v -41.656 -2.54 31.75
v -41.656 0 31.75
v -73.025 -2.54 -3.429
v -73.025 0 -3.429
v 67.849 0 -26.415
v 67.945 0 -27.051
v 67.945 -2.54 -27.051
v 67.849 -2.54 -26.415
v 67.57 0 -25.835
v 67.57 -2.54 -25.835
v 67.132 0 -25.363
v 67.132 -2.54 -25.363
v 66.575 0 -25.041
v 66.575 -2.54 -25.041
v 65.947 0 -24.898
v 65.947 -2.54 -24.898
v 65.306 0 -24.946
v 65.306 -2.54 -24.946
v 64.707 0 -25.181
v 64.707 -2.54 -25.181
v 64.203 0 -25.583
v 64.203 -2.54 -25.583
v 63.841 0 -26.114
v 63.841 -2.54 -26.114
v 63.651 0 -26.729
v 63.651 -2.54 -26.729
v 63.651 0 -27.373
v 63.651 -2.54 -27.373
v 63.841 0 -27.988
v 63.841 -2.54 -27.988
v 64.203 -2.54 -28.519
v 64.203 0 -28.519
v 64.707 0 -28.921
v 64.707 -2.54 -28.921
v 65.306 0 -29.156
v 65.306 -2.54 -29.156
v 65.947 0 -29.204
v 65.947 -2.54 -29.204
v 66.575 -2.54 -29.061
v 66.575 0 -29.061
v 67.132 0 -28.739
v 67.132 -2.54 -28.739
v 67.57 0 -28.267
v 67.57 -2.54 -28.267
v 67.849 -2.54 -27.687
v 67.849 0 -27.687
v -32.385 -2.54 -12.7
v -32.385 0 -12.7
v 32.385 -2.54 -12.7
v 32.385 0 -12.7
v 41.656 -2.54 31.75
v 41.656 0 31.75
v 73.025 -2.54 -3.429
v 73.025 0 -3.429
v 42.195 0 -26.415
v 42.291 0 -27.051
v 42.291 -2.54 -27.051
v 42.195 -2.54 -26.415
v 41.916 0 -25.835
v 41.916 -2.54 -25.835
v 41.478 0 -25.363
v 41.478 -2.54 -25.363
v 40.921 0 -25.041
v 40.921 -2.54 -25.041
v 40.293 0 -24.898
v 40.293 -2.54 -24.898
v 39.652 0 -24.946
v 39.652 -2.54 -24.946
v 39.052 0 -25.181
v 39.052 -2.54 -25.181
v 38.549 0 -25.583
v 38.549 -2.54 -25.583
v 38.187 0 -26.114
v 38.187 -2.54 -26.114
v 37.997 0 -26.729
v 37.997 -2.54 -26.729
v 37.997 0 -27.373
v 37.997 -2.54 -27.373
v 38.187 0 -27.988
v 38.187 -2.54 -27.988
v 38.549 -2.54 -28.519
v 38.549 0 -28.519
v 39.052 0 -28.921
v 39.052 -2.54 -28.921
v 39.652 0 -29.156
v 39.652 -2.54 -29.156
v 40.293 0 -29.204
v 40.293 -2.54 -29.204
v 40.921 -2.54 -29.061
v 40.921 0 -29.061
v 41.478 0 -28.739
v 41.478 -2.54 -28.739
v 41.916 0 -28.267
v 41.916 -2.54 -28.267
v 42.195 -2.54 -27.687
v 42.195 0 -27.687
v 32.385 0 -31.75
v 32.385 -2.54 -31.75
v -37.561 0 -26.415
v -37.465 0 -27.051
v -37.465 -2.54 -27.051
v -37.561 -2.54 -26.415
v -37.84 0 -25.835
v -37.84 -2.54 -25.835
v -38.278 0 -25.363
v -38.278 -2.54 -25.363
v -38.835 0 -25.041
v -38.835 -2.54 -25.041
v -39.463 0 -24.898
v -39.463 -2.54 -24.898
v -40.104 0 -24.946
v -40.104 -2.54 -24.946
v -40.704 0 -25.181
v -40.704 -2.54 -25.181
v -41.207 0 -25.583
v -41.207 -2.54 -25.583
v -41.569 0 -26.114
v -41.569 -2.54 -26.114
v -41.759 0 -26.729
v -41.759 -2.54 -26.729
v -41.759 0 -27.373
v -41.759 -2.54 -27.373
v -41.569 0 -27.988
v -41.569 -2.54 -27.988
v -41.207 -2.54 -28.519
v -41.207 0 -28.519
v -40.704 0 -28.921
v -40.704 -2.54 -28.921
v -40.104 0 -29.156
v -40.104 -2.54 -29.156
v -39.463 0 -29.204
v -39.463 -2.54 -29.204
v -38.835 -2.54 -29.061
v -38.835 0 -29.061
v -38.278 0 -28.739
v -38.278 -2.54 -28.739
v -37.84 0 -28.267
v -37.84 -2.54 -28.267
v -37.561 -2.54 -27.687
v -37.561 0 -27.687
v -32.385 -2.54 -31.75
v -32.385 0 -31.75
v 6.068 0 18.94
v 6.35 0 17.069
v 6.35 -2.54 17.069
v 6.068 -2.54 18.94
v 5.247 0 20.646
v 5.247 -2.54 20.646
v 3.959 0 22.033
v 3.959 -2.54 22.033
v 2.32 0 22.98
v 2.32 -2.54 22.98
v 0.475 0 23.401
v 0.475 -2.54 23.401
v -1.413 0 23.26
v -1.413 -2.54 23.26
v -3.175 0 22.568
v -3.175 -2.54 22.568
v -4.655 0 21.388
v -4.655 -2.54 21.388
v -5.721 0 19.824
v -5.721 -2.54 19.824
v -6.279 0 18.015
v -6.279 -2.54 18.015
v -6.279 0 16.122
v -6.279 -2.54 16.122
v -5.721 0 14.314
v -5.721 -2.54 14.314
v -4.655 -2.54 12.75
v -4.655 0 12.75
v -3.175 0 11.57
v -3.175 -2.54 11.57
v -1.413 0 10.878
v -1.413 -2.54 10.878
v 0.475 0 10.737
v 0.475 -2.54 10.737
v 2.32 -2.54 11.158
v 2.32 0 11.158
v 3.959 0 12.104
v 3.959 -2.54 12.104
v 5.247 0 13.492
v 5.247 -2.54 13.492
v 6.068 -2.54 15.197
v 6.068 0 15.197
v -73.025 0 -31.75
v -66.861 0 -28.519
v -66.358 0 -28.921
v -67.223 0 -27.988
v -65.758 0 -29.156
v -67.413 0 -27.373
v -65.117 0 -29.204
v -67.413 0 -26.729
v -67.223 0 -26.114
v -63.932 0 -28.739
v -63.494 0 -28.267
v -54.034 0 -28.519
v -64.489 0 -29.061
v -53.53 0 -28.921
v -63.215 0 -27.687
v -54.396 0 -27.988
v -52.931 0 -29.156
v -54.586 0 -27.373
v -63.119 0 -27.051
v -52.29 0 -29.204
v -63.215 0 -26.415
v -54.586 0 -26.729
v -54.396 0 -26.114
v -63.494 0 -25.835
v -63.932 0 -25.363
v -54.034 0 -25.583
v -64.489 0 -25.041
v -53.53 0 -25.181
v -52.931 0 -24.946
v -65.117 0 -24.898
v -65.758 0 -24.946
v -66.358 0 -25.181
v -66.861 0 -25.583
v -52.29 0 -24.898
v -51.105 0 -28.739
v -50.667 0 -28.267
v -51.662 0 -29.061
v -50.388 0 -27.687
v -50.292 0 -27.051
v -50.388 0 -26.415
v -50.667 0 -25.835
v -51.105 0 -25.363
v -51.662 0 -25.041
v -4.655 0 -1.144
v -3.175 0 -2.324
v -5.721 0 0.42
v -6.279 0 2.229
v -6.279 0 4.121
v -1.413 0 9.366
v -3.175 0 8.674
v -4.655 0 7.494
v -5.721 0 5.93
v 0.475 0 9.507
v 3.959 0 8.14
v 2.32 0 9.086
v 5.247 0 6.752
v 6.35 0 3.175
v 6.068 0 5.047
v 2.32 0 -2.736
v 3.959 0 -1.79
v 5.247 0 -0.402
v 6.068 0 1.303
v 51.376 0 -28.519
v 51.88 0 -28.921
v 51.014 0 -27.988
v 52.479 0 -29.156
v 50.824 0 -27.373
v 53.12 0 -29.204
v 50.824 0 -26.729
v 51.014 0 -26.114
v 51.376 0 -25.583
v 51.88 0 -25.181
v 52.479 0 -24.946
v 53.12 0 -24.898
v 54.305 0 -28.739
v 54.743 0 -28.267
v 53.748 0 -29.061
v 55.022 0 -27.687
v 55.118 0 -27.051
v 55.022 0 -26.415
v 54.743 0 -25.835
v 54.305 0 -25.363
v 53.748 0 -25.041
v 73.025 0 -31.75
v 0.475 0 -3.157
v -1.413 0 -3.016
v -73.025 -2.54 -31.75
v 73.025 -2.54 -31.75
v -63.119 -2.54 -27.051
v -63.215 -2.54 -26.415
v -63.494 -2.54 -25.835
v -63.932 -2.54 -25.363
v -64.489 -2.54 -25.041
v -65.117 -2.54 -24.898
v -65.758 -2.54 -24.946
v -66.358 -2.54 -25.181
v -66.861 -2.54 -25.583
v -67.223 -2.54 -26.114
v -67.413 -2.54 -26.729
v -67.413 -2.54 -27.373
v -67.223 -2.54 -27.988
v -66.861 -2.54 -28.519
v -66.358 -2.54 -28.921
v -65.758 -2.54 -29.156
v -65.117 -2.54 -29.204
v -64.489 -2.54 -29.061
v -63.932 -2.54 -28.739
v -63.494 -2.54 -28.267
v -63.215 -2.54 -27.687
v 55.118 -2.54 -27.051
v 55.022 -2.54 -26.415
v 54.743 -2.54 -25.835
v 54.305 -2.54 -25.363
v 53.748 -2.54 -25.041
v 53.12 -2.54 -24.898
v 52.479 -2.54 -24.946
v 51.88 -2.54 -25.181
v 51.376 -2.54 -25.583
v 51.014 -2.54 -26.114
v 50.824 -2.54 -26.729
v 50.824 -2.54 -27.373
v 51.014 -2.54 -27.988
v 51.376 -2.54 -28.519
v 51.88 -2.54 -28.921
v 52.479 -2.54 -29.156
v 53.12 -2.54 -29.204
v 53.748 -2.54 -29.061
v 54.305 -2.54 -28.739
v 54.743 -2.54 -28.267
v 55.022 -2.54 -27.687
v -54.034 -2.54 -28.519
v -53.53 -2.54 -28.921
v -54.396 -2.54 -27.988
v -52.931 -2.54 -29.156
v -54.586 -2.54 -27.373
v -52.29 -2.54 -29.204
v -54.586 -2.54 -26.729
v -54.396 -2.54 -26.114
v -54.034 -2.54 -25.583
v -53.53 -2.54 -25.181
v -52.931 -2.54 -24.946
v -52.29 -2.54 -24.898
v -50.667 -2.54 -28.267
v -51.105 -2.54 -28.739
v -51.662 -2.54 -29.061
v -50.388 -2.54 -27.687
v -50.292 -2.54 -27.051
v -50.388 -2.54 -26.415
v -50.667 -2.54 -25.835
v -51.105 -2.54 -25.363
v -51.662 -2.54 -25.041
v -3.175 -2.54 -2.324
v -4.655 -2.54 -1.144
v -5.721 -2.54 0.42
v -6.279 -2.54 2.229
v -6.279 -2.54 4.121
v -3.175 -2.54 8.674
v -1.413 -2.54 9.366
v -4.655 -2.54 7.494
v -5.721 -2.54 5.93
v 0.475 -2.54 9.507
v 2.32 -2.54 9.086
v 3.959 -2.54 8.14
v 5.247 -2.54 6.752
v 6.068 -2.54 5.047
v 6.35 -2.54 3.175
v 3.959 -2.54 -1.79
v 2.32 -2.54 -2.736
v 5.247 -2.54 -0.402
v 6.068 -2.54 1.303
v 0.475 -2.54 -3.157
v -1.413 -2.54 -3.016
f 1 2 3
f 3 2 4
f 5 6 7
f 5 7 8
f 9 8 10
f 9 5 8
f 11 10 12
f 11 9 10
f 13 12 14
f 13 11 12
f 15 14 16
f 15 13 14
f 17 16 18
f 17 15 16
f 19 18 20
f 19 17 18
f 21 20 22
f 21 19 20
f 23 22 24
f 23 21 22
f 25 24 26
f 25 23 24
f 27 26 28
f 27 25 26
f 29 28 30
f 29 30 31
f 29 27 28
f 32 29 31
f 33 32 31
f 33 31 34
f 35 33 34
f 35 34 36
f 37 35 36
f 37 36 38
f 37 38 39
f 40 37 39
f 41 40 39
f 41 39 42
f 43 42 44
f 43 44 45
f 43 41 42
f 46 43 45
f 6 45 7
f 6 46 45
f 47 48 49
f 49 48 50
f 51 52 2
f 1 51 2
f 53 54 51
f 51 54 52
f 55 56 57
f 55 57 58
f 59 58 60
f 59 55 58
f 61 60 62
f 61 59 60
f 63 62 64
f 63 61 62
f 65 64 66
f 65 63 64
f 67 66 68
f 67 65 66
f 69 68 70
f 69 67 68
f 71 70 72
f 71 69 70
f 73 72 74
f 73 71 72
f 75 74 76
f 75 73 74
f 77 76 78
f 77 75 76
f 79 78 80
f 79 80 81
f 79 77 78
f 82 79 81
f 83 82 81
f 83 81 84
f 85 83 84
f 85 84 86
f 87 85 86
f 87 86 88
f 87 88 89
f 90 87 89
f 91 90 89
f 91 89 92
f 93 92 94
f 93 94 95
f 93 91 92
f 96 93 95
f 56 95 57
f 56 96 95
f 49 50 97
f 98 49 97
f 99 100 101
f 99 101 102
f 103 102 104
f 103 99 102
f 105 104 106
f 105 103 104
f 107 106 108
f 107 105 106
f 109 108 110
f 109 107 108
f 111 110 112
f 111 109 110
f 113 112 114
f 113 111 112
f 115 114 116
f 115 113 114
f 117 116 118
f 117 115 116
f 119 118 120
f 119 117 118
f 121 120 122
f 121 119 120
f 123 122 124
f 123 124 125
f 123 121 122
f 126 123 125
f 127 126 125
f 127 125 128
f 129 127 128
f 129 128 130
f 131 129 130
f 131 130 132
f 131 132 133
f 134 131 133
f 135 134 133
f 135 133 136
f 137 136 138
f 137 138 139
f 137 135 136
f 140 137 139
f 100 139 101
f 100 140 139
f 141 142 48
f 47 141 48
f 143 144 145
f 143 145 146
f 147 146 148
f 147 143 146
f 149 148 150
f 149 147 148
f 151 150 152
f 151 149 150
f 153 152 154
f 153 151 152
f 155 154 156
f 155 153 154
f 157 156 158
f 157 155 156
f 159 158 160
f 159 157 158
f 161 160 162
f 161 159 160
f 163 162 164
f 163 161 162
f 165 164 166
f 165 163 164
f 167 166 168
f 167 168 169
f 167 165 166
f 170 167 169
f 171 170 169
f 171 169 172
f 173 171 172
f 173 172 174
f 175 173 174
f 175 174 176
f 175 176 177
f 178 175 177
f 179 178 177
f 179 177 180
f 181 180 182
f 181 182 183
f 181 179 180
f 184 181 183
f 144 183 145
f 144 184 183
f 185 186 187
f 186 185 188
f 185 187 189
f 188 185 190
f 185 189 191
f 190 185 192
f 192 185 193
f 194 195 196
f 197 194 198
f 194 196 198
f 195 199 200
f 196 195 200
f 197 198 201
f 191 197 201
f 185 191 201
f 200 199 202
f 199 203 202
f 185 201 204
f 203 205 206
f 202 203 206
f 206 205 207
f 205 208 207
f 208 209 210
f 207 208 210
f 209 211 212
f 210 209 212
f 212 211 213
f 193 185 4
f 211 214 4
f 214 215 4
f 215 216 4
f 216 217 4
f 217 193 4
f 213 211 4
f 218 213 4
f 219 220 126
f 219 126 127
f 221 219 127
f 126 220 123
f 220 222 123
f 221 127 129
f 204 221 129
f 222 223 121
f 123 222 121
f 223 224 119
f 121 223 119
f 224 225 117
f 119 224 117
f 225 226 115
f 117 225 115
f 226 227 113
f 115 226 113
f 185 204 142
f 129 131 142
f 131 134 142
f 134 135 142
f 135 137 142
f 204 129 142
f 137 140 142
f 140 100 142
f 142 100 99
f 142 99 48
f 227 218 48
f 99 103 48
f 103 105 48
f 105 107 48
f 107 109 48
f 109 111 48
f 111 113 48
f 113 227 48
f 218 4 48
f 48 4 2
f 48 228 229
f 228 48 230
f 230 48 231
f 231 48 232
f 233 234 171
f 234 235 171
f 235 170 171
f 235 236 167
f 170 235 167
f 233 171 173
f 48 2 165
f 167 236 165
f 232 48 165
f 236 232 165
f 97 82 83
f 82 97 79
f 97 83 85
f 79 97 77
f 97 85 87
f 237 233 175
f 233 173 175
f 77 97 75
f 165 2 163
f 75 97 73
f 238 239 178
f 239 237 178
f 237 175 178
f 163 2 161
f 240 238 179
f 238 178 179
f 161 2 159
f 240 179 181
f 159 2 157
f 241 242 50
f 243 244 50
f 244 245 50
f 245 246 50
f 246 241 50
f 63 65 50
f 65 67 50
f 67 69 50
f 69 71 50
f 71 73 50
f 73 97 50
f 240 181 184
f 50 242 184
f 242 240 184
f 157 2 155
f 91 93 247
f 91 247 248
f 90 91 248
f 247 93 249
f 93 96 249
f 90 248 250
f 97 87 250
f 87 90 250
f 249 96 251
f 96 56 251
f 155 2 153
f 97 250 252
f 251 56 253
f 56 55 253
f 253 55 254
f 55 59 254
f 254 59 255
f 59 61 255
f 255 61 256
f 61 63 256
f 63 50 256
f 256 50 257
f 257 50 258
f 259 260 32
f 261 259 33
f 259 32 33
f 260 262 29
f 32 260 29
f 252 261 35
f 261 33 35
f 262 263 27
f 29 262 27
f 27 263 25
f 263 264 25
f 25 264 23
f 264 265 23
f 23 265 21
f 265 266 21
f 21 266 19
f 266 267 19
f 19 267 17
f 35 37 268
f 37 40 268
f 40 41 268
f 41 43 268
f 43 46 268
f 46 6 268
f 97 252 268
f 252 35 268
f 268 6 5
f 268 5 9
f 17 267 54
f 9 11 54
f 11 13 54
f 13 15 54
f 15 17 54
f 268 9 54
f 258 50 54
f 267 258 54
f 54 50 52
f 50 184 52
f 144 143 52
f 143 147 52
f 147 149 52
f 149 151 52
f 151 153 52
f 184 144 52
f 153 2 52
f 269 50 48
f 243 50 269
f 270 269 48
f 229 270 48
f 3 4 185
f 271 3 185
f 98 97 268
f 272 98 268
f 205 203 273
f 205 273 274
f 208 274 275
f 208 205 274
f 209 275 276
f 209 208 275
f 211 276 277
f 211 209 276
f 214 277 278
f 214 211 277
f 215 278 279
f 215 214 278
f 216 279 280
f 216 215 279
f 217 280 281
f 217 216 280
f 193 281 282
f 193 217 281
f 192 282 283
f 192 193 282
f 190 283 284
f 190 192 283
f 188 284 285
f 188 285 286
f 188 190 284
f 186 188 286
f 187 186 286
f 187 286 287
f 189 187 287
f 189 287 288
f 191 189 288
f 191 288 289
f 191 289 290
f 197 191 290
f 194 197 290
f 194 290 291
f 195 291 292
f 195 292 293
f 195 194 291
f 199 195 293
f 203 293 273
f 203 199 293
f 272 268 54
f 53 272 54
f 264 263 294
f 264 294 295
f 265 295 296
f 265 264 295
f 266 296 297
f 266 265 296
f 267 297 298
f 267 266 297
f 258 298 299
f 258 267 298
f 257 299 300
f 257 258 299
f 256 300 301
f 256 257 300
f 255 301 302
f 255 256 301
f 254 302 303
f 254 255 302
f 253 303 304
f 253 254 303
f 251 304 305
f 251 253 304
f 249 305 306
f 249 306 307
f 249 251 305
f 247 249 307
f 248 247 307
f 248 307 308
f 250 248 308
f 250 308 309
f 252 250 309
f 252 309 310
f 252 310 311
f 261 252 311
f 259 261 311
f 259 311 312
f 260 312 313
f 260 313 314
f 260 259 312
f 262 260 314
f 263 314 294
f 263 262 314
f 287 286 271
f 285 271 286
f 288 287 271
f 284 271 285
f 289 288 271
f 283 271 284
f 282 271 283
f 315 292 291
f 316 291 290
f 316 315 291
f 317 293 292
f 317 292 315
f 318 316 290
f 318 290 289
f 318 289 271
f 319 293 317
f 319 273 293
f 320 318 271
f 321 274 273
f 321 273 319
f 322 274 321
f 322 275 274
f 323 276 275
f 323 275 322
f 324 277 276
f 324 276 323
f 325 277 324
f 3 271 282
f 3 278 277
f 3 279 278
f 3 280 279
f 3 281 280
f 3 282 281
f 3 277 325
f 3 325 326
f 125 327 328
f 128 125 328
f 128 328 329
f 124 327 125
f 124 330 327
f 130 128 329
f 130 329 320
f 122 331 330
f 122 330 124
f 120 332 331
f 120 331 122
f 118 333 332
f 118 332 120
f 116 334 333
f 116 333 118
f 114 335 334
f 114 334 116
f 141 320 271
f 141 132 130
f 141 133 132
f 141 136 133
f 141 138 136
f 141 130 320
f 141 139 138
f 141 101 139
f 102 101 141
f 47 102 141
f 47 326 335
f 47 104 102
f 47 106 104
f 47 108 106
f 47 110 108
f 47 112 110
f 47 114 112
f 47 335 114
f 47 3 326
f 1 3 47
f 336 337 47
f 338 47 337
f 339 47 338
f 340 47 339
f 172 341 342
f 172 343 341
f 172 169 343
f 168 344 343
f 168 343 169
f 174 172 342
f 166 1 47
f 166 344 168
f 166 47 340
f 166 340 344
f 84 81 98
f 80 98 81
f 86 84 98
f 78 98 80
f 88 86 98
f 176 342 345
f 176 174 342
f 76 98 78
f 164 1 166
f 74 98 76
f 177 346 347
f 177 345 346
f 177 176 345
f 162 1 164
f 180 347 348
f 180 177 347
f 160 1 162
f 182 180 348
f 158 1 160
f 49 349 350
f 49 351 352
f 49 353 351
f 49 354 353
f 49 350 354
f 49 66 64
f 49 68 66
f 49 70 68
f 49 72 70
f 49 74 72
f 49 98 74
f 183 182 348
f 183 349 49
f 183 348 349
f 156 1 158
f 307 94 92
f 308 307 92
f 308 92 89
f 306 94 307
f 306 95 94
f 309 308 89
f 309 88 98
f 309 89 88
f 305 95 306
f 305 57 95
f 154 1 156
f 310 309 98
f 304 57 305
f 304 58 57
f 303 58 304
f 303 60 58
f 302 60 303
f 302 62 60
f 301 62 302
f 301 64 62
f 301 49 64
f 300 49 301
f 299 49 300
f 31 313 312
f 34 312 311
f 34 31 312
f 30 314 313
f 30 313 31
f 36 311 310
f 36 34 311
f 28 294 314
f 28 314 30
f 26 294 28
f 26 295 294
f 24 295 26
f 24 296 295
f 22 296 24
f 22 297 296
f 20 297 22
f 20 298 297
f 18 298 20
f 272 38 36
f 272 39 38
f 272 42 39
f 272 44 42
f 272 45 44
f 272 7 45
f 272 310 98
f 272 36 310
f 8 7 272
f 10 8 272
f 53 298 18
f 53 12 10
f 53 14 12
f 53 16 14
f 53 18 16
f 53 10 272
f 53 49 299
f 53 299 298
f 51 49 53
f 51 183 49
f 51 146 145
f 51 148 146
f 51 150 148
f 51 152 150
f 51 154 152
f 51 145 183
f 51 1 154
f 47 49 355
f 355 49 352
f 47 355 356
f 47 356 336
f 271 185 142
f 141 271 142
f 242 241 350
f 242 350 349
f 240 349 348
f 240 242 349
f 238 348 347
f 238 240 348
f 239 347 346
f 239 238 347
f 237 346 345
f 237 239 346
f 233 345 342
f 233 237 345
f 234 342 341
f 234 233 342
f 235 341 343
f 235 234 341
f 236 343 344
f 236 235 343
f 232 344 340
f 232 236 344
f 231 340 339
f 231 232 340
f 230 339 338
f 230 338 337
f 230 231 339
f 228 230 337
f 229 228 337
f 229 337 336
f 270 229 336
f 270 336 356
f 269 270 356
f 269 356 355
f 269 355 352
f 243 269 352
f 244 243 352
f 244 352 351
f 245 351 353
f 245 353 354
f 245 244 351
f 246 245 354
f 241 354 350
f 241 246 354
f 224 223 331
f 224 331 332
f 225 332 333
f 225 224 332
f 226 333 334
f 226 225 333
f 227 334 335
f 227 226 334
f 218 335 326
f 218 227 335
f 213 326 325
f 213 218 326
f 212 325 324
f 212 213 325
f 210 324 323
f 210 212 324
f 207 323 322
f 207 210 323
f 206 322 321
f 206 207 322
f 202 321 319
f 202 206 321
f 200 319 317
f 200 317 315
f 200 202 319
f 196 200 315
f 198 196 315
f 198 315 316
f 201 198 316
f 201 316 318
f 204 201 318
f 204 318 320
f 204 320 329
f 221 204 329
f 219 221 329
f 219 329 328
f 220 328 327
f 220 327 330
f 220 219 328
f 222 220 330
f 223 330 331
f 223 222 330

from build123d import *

# Parameters (mm, degrees)
F0_R     = 2.159
F0_R_2   = 6.35
F1_DEPTH = 2.54


with BuildPart() as f1:
    # F0 (on Front) → F1 (new body)
    with BuildSketch(Plane.XZ):
        Polygon((73.025, -3.429), (41.656, 31.75), (32.385, 31.75), (-32.385, 31.75), (-41.656, 31.75), (-73.025, -3.429), (-73.025, -12.7), (-73.025, -31.75), (-32.385, -31.75), (-32.385, -12.7), (32.385, -12.7), (32.385, -31.75), (73.025, -31.75), (73.025, -12.7), align=None)
        with Locations((-65.278, -27.051)):
            Circle(F0_R, mode=Mode.SUBTRACT)
        with Locations((-52.451, -27.051)):
            Circle(F0_R, mode=Mode.SUBTRACT)
        with Locations((-39.624, -27.051)):
            Circle(F0_R, mode=Mode.SUBTRACT)
        with Locations((40.132, -27.051)):
            Circle(F0_R, mode=Mode.SUBTRACT)
        with Locations((52.959, -27.051)):
            Circle(F0_R, mode=Mode.SUBTRACT)
        with Locations((65.786, -27.051)):
            Circle(F0_R, mode=Mode.SUBTRACT)
        with Locations((0, 3.175)):
            Circle(F0_R_2, mode=Mode.SUBTRACT)
        with Locations((0, 17.0688)):
            Circle(F0_R_2, mode=Mode.SUBTRACT)
    extrude(amount=F1_DEPTH)


solid = f1.part
